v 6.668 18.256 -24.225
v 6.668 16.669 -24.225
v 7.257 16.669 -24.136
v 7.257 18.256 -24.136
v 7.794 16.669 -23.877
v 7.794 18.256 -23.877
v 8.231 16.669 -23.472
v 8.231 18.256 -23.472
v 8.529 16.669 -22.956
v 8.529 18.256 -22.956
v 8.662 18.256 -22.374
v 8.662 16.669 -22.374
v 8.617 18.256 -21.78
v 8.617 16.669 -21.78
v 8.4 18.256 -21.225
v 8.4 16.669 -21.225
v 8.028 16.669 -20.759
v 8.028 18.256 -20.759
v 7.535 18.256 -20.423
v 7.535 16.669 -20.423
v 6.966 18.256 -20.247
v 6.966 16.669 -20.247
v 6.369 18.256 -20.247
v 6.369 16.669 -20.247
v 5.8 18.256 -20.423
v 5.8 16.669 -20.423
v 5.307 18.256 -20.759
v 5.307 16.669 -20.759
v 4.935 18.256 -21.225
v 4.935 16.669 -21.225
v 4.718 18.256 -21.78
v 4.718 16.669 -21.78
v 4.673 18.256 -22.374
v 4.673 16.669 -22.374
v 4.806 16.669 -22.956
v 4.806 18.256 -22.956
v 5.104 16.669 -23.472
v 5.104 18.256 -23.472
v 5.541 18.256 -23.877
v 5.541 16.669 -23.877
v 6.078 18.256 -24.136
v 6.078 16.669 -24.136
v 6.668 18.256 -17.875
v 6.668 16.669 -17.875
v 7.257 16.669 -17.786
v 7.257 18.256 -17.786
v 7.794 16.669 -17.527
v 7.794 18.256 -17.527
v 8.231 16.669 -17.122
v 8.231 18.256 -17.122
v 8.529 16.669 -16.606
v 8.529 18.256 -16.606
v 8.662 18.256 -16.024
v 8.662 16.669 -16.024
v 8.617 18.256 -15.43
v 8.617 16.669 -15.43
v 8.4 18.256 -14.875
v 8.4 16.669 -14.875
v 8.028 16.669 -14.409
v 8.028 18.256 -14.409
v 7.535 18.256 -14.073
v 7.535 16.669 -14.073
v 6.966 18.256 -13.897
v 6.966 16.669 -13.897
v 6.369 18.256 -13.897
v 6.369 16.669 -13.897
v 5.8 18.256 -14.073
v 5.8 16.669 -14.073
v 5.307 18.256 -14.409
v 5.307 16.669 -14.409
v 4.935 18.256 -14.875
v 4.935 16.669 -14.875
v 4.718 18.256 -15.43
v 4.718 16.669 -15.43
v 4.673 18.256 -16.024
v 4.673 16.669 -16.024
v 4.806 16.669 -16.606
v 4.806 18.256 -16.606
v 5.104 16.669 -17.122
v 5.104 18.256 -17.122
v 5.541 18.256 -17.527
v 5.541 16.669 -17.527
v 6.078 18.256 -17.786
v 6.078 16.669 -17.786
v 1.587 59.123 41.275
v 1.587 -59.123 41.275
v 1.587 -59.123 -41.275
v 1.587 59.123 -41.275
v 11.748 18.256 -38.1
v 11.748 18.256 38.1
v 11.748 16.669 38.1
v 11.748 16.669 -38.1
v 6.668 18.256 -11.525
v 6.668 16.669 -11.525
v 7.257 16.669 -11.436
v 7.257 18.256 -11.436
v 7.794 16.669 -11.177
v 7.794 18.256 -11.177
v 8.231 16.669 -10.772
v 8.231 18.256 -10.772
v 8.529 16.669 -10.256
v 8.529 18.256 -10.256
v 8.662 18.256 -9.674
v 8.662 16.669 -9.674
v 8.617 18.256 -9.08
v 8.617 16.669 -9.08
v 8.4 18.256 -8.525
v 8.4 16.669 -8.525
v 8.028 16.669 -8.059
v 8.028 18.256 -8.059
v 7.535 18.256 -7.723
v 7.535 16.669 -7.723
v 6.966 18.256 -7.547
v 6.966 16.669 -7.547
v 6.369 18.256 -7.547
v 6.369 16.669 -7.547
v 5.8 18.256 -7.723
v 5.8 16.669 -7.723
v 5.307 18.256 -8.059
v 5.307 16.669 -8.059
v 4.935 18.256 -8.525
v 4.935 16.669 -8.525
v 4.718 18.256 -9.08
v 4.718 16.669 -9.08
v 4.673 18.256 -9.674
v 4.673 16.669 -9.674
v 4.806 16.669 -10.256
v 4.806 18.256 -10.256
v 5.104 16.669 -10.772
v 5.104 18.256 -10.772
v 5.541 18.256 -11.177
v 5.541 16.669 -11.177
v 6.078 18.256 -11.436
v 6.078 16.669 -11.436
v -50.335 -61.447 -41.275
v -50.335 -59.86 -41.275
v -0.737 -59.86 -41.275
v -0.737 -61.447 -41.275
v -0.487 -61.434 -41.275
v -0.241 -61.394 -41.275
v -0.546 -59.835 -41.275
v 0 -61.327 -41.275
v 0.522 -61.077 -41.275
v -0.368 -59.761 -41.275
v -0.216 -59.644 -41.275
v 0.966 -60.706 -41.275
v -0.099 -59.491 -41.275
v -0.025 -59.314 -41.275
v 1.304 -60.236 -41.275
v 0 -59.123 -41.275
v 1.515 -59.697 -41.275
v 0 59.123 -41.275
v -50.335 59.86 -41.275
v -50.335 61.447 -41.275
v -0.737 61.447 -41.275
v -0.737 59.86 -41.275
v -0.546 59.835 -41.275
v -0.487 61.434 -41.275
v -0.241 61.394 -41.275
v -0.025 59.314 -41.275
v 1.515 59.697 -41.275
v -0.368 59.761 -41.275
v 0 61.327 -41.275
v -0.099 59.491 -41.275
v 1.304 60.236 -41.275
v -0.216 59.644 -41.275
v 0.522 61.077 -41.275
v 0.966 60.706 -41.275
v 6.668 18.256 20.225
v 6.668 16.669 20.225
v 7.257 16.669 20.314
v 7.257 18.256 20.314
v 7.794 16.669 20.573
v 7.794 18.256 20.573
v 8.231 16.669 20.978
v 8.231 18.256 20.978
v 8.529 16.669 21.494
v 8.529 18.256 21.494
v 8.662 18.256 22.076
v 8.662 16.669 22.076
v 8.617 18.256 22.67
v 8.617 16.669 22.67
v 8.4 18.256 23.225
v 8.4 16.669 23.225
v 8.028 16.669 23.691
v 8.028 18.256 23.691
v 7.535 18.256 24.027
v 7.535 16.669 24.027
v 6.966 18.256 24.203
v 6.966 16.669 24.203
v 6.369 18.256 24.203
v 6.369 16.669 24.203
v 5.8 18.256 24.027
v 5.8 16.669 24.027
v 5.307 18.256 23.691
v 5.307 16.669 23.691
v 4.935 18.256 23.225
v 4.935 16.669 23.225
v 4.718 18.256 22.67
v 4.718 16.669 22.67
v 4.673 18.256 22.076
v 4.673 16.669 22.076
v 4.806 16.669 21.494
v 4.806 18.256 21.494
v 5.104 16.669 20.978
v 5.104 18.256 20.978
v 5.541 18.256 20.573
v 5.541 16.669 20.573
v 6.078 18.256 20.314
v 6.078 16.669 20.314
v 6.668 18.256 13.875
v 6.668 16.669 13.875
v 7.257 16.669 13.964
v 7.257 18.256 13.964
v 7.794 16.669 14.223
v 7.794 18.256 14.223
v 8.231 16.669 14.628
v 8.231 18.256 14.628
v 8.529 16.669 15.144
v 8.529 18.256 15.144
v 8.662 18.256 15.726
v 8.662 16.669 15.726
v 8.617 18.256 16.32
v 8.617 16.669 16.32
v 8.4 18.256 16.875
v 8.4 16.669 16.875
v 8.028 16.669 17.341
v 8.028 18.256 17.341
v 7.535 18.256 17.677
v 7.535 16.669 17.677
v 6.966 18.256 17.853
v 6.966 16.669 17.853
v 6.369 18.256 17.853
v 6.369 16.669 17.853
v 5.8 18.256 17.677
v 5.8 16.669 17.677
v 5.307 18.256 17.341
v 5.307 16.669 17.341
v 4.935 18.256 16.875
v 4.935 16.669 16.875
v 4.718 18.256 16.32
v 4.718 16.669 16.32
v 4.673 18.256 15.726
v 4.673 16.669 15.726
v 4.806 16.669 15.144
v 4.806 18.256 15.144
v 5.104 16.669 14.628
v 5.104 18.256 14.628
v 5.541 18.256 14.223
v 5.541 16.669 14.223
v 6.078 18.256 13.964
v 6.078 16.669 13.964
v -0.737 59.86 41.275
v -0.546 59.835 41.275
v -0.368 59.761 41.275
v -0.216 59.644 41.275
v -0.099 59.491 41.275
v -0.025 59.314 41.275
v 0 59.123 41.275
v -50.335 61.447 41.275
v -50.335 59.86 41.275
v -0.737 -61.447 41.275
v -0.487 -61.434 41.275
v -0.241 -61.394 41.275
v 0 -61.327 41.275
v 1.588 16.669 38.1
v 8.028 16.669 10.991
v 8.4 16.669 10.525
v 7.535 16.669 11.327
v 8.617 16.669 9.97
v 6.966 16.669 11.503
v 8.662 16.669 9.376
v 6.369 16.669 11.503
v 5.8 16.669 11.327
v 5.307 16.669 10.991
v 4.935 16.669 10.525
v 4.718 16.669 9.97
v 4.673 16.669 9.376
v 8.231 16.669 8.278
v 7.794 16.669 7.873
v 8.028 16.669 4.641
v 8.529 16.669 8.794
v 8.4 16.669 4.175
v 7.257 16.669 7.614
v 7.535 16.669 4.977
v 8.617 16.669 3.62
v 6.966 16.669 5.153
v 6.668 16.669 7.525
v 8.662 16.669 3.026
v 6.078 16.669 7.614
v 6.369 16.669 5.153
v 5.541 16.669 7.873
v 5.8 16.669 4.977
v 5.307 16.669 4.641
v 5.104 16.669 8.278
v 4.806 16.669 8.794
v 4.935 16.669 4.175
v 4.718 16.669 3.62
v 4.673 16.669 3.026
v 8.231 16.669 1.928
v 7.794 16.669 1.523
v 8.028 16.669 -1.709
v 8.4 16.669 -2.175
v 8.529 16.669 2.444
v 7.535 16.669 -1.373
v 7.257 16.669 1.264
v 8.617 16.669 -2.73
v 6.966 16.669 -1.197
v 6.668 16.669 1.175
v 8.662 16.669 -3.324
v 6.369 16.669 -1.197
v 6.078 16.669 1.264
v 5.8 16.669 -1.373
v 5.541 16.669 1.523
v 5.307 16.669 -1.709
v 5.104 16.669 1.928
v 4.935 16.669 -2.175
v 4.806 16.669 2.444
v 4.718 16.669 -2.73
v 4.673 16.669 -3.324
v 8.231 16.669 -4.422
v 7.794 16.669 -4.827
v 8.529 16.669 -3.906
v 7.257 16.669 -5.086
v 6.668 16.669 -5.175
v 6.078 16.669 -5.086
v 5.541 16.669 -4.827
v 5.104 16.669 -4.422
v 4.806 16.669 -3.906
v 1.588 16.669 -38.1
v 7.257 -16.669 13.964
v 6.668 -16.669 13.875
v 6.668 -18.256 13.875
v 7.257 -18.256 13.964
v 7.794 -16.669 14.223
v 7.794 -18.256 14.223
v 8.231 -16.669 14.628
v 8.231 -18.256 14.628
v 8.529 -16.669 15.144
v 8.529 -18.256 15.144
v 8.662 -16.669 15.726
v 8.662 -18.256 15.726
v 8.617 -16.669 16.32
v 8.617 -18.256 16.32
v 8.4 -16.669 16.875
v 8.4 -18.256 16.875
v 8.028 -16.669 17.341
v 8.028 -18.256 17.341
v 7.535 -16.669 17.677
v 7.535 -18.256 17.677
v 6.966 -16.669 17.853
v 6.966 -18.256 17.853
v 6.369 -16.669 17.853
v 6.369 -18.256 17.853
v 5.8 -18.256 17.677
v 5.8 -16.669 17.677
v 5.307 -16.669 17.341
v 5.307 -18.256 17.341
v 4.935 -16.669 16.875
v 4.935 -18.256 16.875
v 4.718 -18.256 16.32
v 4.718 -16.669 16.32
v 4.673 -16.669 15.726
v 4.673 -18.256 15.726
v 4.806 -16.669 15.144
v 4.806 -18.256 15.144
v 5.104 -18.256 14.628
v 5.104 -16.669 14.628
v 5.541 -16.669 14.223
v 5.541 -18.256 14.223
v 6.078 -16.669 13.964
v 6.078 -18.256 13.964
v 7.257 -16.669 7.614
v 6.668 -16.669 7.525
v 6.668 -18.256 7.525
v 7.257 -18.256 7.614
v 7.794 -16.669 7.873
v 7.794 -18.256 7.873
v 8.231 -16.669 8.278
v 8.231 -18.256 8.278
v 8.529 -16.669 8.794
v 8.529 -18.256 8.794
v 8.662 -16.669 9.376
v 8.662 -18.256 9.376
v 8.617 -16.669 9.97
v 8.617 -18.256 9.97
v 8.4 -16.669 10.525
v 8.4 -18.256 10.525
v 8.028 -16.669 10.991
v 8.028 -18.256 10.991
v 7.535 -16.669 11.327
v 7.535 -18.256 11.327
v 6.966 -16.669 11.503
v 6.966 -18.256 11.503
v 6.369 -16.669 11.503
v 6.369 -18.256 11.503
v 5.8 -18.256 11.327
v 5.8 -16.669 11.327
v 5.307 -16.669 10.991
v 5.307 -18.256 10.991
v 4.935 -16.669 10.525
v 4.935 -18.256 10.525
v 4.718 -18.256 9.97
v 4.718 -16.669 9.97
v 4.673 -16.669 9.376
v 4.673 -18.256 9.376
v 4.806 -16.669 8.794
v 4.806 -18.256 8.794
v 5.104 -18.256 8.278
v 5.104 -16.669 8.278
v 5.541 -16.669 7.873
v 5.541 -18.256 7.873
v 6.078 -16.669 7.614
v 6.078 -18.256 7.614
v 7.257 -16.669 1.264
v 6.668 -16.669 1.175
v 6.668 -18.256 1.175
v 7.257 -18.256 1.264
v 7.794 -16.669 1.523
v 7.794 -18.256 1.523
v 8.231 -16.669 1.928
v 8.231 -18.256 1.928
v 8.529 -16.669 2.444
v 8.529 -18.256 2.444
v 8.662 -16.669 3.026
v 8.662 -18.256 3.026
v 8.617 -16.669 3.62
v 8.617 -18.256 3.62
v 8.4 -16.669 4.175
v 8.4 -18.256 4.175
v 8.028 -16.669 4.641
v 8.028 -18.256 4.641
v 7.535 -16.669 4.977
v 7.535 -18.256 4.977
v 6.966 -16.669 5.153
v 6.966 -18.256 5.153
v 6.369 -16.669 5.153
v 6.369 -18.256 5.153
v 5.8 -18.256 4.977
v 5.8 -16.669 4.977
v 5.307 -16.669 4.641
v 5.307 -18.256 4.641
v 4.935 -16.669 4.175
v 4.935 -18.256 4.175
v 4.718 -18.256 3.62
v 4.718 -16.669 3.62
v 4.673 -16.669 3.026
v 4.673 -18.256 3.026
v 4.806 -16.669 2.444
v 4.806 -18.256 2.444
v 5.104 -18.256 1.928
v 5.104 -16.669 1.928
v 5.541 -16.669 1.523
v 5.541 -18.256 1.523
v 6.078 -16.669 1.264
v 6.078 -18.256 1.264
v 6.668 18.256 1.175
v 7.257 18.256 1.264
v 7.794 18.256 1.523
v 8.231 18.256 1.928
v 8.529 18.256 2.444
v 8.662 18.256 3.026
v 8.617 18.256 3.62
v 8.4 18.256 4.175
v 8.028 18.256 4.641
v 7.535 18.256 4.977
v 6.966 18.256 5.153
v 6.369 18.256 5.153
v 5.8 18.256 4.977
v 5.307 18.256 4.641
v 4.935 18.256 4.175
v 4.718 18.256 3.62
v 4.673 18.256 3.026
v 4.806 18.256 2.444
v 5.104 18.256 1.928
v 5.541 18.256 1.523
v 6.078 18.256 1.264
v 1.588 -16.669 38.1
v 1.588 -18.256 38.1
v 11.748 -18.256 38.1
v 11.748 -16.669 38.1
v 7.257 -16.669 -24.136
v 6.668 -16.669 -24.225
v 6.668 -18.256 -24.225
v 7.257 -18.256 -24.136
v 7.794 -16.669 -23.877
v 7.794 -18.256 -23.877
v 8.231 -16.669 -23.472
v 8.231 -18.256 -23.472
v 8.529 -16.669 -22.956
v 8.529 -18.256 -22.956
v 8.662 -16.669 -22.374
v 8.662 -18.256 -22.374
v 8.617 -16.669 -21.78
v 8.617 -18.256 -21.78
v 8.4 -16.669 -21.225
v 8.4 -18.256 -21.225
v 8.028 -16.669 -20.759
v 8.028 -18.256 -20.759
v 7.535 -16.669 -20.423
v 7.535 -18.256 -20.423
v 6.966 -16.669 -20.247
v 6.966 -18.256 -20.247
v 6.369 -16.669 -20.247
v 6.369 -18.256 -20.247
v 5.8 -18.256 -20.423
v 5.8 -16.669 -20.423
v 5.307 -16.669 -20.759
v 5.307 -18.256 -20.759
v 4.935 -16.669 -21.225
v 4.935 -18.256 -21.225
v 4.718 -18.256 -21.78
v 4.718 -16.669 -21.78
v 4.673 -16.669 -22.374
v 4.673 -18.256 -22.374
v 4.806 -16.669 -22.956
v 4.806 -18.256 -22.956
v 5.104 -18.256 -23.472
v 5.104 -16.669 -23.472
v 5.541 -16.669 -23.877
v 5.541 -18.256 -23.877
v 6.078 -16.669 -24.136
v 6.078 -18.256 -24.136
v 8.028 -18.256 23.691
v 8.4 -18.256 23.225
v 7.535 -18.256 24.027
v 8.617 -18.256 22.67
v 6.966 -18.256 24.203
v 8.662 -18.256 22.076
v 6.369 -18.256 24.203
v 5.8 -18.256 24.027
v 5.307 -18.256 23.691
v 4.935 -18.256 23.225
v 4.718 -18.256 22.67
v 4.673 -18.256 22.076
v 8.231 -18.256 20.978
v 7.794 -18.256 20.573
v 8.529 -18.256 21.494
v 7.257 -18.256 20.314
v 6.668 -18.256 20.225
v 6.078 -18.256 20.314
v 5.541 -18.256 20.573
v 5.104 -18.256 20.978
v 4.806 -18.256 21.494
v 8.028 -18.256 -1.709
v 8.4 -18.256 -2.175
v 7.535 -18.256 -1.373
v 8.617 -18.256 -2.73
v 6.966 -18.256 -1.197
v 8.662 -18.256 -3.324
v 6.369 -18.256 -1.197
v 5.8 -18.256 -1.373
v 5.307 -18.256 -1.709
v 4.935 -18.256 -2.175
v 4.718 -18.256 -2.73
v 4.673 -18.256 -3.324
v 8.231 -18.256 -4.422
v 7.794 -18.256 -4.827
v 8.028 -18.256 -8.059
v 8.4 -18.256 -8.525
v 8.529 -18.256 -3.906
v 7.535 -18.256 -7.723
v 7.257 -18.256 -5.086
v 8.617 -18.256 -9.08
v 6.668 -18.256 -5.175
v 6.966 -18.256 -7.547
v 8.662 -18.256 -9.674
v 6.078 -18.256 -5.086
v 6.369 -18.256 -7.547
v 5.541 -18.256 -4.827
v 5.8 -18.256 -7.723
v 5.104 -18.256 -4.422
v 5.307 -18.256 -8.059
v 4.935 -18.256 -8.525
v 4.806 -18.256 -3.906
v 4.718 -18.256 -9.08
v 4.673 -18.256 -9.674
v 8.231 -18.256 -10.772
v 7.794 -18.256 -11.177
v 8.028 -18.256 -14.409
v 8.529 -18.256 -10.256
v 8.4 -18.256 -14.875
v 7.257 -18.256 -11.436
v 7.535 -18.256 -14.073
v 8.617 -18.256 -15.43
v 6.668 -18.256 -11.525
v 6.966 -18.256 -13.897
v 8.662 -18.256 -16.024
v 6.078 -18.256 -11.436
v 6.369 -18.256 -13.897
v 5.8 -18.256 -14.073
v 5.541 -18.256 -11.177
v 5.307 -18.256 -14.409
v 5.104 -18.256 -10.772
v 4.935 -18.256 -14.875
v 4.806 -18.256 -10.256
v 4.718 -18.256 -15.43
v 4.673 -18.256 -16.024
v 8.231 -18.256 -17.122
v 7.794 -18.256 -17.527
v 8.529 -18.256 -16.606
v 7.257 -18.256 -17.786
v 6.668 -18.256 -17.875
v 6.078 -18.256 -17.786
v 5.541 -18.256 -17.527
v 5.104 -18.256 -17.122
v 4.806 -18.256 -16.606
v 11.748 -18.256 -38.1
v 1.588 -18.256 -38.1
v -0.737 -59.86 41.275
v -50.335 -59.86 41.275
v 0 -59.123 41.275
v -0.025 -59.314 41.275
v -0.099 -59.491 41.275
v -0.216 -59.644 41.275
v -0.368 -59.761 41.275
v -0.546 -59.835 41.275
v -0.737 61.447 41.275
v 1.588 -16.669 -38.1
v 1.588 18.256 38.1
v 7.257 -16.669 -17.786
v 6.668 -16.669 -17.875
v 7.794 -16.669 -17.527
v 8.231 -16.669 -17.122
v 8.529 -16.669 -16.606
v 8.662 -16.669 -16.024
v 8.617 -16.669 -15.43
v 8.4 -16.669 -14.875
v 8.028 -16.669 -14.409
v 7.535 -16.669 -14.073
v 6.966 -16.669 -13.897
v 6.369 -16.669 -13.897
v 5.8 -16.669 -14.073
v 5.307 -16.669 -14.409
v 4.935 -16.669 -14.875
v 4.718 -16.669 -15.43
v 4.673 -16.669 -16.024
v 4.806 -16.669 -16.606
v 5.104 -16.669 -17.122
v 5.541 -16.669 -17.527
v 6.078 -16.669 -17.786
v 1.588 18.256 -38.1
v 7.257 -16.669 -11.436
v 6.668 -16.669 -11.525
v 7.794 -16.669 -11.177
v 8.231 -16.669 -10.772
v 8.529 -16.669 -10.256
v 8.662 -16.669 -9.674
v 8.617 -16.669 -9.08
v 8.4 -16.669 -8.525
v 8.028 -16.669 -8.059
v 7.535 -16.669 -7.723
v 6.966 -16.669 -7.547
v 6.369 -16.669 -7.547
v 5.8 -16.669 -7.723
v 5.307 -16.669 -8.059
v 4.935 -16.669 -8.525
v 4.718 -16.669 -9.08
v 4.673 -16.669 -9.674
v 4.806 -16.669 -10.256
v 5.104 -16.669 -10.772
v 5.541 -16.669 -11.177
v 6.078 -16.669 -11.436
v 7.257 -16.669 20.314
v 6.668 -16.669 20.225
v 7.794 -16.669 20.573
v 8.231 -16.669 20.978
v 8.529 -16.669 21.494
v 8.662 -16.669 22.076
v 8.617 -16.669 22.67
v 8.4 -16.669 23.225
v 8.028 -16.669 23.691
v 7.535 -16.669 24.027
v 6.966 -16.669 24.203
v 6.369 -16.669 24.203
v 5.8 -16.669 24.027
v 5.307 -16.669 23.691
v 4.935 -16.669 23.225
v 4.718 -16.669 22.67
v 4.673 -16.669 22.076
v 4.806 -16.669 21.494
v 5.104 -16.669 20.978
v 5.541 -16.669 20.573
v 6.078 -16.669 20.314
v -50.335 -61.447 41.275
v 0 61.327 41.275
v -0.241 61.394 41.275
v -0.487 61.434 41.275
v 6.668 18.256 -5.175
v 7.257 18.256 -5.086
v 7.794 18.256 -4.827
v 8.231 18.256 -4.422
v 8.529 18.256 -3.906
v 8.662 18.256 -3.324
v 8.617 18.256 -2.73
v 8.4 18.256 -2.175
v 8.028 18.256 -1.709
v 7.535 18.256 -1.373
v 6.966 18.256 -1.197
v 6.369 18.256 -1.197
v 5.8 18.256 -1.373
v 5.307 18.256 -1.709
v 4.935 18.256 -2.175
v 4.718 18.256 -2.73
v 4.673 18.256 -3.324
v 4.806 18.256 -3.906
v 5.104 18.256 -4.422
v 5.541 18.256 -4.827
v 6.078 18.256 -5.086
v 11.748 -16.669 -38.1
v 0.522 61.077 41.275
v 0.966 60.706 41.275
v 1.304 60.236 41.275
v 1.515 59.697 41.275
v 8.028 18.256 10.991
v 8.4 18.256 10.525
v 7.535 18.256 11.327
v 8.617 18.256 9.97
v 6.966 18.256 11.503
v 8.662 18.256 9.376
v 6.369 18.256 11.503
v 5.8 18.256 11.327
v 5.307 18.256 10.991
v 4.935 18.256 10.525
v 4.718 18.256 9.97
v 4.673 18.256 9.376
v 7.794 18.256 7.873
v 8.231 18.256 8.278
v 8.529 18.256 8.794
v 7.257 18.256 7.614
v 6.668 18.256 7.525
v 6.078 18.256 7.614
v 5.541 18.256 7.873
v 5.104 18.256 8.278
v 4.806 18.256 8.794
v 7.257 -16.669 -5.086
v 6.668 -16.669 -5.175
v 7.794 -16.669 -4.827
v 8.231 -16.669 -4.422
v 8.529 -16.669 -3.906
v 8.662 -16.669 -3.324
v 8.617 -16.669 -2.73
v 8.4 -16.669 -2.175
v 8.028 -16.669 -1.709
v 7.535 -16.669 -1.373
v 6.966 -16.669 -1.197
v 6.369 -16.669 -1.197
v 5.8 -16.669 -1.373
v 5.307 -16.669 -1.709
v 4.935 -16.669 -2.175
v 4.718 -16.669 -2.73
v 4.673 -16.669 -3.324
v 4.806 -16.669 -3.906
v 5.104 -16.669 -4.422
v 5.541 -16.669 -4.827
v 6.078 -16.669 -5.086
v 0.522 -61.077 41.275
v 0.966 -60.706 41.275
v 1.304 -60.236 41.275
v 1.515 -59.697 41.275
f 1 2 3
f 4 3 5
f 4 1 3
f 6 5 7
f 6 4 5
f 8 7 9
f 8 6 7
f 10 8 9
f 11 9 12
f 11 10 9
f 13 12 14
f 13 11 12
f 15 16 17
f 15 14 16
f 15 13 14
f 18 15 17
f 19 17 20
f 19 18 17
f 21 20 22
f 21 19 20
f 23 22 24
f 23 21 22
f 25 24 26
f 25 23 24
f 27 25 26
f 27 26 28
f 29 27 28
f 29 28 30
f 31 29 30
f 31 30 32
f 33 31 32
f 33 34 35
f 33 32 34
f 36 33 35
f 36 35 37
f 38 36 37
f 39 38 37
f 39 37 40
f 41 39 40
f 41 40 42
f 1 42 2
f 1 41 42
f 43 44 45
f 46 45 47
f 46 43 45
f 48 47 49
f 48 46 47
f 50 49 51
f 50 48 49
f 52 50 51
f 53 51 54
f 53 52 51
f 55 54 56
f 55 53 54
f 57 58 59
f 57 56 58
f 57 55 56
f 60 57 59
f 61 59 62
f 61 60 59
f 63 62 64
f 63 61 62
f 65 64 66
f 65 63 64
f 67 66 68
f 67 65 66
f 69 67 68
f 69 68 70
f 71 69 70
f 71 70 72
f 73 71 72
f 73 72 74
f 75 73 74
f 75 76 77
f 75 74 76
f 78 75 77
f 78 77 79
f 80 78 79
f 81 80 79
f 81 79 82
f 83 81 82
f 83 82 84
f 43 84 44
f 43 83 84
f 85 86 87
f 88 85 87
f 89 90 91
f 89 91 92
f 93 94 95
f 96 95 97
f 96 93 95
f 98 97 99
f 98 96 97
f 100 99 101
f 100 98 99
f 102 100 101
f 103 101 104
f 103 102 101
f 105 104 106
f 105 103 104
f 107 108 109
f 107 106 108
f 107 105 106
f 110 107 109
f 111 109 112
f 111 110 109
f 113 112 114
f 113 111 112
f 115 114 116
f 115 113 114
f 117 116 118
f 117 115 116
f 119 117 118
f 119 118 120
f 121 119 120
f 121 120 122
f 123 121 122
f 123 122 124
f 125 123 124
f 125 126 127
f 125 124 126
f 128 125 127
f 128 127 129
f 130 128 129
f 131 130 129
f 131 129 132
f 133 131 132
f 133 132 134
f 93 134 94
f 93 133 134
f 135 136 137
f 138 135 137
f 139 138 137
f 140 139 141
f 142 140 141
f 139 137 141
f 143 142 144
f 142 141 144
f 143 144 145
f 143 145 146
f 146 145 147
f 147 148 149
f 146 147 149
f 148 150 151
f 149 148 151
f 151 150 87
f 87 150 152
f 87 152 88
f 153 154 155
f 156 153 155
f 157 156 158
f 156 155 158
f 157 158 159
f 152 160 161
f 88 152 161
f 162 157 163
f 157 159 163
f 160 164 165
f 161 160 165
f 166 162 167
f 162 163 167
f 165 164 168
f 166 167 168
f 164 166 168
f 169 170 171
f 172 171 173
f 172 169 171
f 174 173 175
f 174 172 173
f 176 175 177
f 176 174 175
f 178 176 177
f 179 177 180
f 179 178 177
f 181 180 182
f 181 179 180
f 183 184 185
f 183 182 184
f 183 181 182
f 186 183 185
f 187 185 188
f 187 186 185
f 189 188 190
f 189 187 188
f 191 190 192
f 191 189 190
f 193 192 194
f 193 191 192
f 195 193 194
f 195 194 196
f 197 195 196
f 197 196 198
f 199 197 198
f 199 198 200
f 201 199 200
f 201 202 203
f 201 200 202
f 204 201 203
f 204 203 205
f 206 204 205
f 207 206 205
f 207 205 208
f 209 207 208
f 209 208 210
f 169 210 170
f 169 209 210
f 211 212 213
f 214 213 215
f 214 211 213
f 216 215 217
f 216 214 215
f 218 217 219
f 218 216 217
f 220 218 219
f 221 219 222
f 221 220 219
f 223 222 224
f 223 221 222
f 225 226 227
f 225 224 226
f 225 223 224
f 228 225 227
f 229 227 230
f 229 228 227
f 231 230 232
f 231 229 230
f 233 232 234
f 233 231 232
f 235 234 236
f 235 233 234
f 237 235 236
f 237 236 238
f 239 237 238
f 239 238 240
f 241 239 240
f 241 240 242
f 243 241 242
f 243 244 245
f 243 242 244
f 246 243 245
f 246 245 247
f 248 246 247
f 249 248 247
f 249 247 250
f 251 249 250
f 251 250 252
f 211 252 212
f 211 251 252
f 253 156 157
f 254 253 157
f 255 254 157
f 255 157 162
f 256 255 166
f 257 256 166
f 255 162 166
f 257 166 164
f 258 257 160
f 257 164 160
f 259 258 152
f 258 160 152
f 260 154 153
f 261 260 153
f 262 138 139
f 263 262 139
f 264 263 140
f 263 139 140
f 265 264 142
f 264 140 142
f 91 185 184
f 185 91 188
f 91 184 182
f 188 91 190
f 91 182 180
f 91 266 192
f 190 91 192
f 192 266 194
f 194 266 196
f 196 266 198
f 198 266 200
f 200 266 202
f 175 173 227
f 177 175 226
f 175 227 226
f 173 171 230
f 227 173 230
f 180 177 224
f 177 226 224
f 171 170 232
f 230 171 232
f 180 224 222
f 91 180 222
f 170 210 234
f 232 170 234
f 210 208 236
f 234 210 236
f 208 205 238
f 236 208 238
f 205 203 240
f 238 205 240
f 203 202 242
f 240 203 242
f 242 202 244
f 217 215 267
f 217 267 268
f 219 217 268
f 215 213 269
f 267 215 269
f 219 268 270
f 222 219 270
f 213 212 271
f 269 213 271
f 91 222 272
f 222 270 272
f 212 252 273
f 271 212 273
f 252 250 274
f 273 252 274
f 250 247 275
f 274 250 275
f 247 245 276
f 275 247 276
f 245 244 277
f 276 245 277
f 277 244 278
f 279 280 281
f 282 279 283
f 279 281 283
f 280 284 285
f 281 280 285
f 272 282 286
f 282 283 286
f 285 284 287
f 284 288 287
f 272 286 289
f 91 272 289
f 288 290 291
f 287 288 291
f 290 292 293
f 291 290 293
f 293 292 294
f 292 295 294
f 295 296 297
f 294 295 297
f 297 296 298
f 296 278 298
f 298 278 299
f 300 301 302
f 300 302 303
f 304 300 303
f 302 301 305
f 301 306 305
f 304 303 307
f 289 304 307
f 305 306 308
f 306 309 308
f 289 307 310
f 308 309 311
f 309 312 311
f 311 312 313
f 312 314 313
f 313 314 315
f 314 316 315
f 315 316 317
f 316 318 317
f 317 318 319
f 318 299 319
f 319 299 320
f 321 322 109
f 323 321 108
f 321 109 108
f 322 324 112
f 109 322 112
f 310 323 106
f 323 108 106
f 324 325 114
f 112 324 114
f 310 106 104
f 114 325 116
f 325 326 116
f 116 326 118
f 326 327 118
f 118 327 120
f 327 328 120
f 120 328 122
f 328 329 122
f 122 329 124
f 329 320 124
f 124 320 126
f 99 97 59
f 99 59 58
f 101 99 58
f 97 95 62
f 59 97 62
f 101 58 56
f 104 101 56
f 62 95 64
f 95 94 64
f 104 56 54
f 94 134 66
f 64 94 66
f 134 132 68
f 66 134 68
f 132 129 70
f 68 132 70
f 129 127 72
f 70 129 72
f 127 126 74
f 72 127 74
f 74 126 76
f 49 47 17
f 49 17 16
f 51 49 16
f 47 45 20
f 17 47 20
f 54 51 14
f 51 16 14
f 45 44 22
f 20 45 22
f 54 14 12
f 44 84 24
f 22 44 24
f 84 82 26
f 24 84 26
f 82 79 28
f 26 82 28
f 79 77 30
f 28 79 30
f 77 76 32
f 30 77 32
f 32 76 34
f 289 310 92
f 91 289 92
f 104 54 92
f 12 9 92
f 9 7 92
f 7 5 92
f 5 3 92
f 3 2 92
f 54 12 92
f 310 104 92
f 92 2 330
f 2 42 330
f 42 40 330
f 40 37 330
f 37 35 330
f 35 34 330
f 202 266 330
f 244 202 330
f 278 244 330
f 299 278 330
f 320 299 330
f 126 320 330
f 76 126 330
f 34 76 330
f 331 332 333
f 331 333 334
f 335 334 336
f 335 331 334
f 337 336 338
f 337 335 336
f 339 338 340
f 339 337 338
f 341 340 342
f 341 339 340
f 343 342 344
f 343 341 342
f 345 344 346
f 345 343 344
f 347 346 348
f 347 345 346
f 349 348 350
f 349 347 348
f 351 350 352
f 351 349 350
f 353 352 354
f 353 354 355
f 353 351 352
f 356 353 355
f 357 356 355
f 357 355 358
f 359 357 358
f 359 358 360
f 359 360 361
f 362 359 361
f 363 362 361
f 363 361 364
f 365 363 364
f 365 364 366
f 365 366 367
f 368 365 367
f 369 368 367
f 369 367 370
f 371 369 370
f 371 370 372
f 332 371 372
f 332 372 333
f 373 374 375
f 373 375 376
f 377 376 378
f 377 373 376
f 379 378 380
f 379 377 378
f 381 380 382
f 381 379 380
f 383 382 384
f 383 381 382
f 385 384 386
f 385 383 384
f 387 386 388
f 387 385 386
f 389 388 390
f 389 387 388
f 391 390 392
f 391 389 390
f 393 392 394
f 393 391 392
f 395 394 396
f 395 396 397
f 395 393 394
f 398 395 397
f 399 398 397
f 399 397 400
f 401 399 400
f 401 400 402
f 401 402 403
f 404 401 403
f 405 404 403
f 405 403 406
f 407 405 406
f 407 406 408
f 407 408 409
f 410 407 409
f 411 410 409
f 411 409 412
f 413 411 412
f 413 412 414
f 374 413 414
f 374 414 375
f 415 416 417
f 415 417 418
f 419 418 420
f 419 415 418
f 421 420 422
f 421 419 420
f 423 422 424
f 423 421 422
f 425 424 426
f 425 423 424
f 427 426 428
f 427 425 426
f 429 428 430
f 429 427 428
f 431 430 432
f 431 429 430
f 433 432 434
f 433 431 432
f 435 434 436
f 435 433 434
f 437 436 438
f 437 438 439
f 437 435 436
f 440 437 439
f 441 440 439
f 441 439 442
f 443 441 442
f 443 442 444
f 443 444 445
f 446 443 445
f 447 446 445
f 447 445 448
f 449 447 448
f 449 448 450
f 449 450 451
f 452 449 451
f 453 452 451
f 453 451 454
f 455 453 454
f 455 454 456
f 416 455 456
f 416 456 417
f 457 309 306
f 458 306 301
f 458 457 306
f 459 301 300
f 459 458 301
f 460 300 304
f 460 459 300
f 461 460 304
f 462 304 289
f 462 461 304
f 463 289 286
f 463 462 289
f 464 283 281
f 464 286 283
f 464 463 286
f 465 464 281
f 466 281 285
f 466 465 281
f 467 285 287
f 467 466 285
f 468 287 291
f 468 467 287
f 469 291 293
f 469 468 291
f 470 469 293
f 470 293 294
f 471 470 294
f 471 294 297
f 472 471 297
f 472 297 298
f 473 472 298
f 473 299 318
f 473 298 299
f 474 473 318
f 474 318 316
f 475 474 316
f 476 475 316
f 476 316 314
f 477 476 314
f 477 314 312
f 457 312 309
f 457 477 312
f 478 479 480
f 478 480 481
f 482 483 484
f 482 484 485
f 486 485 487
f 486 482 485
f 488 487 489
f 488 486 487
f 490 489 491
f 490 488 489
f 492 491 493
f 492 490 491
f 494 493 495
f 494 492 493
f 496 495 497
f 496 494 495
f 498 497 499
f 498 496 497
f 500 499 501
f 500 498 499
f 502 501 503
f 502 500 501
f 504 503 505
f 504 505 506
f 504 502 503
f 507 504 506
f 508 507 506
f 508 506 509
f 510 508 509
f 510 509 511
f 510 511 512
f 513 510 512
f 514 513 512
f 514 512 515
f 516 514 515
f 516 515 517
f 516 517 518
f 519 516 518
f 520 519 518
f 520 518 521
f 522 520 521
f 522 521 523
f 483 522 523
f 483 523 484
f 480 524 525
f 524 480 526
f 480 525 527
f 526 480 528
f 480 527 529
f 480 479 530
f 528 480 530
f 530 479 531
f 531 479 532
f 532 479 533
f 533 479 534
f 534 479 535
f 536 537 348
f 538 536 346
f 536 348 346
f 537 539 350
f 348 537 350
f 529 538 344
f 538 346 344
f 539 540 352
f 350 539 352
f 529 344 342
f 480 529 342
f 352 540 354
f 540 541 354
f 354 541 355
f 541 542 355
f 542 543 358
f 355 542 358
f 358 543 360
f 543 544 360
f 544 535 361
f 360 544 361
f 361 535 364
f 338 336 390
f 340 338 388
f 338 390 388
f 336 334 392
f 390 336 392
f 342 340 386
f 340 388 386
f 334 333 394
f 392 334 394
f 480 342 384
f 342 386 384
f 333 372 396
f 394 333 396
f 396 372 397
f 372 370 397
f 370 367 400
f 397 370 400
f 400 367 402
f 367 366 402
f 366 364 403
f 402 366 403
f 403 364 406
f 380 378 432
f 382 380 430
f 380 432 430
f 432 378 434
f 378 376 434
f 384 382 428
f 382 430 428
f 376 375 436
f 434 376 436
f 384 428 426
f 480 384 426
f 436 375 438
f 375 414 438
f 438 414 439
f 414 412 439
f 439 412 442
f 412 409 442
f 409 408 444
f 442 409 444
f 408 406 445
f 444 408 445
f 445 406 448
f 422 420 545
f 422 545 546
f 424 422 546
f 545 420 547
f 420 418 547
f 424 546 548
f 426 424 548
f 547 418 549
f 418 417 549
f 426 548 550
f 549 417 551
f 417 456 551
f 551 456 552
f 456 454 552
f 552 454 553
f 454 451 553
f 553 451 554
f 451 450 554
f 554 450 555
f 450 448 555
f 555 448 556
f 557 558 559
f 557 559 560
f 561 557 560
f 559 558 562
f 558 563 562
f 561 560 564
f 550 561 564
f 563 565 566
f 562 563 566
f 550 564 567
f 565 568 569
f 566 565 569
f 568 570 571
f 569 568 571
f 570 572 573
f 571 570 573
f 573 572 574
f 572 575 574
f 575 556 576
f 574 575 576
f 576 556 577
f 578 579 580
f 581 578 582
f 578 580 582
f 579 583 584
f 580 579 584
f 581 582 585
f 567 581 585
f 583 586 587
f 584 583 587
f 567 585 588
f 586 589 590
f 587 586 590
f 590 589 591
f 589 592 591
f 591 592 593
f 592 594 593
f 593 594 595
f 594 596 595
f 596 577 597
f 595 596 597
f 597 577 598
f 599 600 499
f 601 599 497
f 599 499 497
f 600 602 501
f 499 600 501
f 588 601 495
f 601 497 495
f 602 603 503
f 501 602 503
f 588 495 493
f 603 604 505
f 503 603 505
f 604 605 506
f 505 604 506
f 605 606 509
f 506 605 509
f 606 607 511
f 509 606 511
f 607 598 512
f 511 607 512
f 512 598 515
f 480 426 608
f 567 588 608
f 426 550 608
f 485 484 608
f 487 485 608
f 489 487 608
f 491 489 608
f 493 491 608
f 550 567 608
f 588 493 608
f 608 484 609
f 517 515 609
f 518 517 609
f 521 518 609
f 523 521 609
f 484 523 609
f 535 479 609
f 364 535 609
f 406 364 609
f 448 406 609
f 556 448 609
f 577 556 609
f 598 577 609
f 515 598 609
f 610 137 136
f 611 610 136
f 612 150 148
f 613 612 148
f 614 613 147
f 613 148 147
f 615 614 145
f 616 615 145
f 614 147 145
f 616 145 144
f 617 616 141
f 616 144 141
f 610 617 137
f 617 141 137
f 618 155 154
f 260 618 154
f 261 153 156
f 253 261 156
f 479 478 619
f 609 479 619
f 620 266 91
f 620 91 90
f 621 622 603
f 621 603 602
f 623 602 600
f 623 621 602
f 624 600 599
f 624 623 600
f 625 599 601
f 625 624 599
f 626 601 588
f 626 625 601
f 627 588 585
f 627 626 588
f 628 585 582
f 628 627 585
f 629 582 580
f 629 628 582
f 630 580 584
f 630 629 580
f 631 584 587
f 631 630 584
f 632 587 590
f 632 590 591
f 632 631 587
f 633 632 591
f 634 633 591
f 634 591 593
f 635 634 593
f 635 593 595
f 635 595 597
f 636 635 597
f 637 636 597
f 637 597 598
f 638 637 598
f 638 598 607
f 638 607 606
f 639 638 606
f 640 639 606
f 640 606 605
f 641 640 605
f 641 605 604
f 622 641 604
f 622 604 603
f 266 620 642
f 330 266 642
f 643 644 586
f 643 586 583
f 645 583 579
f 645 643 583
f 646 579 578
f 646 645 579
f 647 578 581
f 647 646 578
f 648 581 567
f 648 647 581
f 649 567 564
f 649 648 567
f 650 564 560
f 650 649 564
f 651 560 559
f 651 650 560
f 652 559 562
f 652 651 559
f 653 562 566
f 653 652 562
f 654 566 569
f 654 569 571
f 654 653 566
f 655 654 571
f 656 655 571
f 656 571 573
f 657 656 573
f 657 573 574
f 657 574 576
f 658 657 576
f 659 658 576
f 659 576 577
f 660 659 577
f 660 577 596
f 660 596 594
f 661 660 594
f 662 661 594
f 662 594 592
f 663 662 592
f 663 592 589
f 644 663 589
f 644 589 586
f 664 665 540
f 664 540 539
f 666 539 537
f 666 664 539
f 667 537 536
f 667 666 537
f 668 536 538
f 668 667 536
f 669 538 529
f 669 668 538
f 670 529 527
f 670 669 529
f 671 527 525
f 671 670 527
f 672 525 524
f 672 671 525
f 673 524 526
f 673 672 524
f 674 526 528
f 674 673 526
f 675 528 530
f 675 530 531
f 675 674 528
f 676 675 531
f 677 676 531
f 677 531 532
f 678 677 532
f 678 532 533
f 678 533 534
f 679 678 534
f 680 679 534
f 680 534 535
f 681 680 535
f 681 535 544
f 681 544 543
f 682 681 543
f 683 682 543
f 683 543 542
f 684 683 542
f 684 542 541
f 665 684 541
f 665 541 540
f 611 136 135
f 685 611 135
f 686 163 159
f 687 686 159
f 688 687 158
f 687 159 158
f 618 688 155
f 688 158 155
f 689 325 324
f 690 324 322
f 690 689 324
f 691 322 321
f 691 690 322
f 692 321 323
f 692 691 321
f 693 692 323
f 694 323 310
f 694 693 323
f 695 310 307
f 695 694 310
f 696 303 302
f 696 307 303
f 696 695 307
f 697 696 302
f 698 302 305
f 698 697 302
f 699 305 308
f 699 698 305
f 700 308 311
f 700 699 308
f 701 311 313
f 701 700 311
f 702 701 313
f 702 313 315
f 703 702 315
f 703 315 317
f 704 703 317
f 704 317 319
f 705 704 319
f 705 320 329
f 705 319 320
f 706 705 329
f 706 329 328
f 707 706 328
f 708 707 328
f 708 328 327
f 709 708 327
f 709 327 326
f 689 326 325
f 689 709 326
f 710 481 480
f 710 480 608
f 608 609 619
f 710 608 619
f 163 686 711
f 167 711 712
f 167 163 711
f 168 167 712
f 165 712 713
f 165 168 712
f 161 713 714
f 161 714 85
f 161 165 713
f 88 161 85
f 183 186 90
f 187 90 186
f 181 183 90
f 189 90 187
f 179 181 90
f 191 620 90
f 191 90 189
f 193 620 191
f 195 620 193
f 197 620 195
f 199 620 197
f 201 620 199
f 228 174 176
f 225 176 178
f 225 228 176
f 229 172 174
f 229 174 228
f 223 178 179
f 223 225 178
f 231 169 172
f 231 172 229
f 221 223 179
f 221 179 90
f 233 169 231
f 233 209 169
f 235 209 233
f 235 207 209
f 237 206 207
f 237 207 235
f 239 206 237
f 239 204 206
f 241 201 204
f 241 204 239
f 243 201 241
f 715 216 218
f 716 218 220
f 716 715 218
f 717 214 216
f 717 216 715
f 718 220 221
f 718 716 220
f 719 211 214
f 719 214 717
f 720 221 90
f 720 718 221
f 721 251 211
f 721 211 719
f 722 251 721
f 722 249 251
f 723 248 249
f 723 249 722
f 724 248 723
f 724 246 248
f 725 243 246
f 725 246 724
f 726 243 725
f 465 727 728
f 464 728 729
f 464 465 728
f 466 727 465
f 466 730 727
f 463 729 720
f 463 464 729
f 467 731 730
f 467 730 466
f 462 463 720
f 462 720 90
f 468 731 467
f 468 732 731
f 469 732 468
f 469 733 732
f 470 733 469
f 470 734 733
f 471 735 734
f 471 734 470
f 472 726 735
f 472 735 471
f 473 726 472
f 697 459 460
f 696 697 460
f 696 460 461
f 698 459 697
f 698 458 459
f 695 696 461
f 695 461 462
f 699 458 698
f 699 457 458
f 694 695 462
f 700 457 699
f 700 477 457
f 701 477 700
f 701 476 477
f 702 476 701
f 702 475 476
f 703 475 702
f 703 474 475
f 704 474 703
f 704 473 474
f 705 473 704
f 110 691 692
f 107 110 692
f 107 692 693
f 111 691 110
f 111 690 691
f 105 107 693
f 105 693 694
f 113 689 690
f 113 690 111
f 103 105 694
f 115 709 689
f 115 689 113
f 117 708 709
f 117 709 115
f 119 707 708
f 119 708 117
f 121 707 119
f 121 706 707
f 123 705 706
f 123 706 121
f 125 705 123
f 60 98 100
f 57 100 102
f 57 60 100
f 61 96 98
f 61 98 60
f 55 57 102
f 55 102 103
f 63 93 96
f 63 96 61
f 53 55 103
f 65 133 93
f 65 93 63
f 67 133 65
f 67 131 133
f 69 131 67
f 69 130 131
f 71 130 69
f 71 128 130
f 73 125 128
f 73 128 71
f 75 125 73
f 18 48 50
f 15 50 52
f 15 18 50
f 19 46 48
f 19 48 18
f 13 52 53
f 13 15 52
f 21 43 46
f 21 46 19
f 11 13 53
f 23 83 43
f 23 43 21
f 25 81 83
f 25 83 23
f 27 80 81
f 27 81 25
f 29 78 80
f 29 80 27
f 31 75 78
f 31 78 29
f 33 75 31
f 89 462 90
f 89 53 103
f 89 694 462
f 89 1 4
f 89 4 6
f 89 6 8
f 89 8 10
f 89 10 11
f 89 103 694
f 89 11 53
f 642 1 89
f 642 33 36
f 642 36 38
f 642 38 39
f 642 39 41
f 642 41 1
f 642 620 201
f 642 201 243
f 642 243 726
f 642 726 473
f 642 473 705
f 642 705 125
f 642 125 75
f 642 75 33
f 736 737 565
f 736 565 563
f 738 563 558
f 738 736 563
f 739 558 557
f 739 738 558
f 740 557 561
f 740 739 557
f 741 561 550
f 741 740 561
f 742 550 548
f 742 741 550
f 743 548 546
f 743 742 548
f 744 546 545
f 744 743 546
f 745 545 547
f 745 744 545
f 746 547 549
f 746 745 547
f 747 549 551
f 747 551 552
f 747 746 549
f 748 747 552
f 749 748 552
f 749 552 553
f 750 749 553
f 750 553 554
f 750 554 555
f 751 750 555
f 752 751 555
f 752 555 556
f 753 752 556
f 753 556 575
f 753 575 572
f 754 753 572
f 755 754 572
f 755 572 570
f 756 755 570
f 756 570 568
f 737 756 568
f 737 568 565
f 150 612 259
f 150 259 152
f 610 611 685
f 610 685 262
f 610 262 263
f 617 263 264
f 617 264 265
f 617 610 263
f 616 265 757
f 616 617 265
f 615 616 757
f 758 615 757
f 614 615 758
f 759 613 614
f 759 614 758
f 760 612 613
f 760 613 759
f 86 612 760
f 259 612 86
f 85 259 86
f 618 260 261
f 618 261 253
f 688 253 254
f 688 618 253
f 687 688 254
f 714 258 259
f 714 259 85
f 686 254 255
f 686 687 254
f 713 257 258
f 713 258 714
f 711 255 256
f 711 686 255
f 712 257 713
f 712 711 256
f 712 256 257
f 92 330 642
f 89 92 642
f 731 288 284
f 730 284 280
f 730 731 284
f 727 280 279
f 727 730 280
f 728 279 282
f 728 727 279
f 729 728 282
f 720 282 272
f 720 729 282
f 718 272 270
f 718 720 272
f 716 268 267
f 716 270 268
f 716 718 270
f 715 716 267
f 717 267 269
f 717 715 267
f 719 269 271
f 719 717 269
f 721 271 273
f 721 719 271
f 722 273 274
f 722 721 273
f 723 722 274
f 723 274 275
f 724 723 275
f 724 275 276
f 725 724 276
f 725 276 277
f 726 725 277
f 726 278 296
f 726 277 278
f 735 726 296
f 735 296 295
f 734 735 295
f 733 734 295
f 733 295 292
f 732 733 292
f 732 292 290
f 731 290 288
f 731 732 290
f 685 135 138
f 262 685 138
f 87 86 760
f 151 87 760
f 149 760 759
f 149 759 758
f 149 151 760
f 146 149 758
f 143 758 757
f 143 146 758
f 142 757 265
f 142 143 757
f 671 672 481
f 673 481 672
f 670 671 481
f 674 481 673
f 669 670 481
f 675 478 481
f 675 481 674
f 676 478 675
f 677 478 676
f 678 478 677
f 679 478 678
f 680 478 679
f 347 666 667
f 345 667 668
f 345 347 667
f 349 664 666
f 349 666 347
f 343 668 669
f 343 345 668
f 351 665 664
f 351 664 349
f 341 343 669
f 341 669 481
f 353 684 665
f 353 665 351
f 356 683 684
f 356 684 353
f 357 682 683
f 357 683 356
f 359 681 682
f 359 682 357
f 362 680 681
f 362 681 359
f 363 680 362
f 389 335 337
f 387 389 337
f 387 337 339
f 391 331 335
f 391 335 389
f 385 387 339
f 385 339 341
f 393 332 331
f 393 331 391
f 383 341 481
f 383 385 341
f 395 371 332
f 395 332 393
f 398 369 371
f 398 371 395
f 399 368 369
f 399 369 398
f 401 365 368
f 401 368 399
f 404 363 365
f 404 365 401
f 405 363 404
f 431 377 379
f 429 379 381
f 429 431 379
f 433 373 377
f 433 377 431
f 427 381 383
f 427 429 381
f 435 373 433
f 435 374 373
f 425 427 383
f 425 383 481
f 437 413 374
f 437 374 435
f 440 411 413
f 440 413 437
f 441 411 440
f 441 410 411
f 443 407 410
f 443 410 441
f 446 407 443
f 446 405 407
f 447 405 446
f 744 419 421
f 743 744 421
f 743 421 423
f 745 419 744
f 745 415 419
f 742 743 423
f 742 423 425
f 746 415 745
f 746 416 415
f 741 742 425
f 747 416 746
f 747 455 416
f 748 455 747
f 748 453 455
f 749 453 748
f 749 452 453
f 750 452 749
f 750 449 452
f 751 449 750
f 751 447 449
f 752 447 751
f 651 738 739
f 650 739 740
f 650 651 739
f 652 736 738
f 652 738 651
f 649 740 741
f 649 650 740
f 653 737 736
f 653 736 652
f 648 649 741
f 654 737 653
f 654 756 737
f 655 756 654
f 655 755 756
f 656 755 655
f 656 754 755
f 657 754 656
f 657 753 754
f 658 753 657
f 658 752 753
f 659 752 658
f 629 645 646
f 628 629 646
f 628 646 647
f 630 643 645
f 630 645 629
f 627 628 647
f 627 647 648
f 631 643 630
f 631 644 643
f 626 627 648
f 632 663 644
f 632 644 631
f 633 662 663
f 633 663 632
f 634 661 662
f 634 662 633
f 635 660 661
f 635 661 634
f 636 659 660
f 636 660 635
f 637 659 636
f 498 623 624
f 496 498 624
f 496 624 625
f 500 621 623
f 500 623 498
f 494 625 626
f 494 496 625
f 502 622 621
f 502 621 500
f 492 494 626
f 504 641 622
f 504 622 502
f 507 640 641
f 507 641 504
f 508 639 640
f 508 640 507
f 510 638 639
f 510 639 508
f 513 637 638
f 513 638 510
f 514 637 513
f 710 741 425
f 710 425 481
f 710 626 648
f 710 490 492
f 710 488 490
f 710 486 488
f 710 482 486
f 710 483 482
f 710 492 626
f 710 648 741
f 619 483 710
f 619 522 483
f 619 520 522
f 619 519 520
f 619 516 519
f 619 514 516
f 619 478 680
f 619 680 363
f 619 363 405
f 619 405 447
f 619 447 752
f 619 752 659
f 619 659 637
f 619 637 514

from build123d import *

# Parameters (mm, degrees)
SKETCH1_W              = 82.55
SKETCH1_H              = 222.25
BASE_FLANGE1_DEPTH     = 1.5875
SKETCHED_START         = -41.275
SKETCHED_BEND1_DEPTH   = 82.55
SKETCHED_BEND1_2_DEPTH = 82.55
SKETCH8_W              = 76.2
SKETCH8_H              = 1.5875
BOSS_EXTRUDE1_DEPTH    = 10.16
BOSS_EXTRUDE1_2_DEPTH  = 10.16
CUT_EXTRUDE1_START     = -36.5125
SKETCH11_R             = 2
CUT_EXTRUDE1_DEPTH     = 36.5125


# Read off the part's stored shape, not the designer's step: Sketched Bend1
# Sheet-metal steps are written as plain solids
with BuildPart() as part:
    # Sketch1 → Base-Flange1 (new body)
    with BuildSketch(Plane(origin=(0, 0, 0), x_dir=(0, 0, -1), z_dir=(1, 0, 0))):
        Rectangle(SKETCH1_W, SKETCH1_H)
    extrude(amount=BASE_FLANGE1_DEPTH)

    # Sketched Bend1 outline → Sketched Bend1 (cut)
    with BuildSketch(Plane.XY.offset(SKETCHED_START)):
        with BuildLine():
            ThreePointArc((0, 61.3273484), (1.149317929, 60.481283273), (1.5875, 59.123065921))
            Line((1.5875, 59.123065921), (1.5875, 111.125))
            Line((1.5875, 111.125), (0, 111.125))
            Line((0, 111.125), (0, 61.3273484))
        make_face()
        with BuildLine():
            Line((1.5875, -111.125), (1.5875, -59.123065921))
            ThreePointArc((1.5875, -59.123065921), (1.149317929, -60.481283273), (0, -61.3273484))
            Line((0, -61.3273484), (0, -111.125))
            Line((0, -111.125), (1.5875, -111.125))
        make_face()
    extrude(amount=SKETCHED_BEND1_DEPTH, mode=Mode.SUBTRACT)

    # Sketched Bend1 2 outline → Sketched Bend1 2 (add)
    with BuildSketch(Plane.XY.offset(SKETCHED_START)):
        with BuildLine():
            Line((0, 59.123065921), (0, 61.3273484))
            ThreePointArc((0, 61.3273484), (-0.363459343, 61.417015977), (-0.7366, 61.447165921))
            Line((-0.7366, 61.447165921), (-50.334665921, 61.447165921))
            Line((-50.334665921, 61.447165921), (-50.334665921, 59.859665921))
            Line((-50.334665921, 59.859665921), (-0.7366, 59.859665921))
            ThreePointArc((-0.7366, 59.859665921), (-0.215745145, 59.643920776), (0, 59.123065921))
        make_face()
        with BuildLine():
            ThreePointArc((-0.7366, -61.447165921), (-0.363459343, -61.417015977), (0, -61.3273484))
            Line((0, -61.3273484), (0, -59.123065921))
            ThreePointArc((0, -59.123065921), (-0.215745145, -59.643920776), (-0.7366, -59.859665921))
            Line((-0.7366, -59.859665921), (-50.334665921, -59.859665921))
            Line((-50.334665921, -59.859665921), (-50.334665921, -61.447165921))
            Line((-50.334665921, -61.447165921), (-0.7366, -61.447165921))
        make_face()
    extrude(amount=SKETCHED_BEND1_2_DEPTH)


with BuildPart() as body_2:
    # Sketch8 → Boss-Extrude1 (new body)
    with BuildSketch(Plane(origin=(1.5875, 0, 0), x_dir=(0, 0, -1), z_dir=(1, 0, 0))):
        with Locations((0, -17.4625)):
            Rectangle(SKETCH8_W, SKETCH8_H)
    extrude(amount=BOSS_EXTRUDE1_DEPTH)


with BuildPart() as body_3:
    # Sketch8 → Boss-Extrude1 2 (new body)
    with BuildSketch(Plane(origin=(1.5875, 0, 0), x_dir=(0, 0, -1), z_dir=(1, 0, 0))):
        with Locations((0, 17.4625)):
            Rectangle(SKETCH8_W, SKETCH8_H)
    extrude(amount=BOSS_EXTRUDE1_2_DEPTH)


with BuildPart() as cut_extrude1_tool:
    # Sketch11 → Cut-Extrude1 (new body)
    with BuildSketch(Plane.XZ.offset(18.25625).offset(CUT_EXTRUDE1_START)):
        with Locations(Location((6.6675, 3.175, 0), (0, 0, 270))):
            Circle(SKETCH11_R)
        with Locations(Location((6.6675, -3.175, 0), (0, 0, 270))):
            Circle(SKETCH11_R)
        with Locations(Location((6.6675, 9.525, 0), (0, 0, 270))):
            Circle(SKETCH11_R)
        with Locations(Location((6.6675, 15.875, 0), (0, 0, 270))):
            Circle(SKETCH11_R)
        with Locations(Location((6.6675, 22.225, 0), (0, 0, 270))):
            Circle(SKETCH11_R)
        with Locations(Location((6.6675, -9.525, 0), (0, 0, 270))):
            Circle(SKETCH11_R)
        with Locations(Location((6.6675, -15.875, 0), (0, 0, 270))):
            Circle(SKETCH11_R)
        with Locations(Location((6.6675, -22.225, 0), (0, 0, 270))):
            Circle(SKETCH11_R)
    extrude(amount=CUT_EXTRUDE1_DEPTH)


with BuildPart() as body_2_1:
    add(body_2.part)

    # Cut-Extrude1: cut by cut_extrude1_tool
    add(cut_extrude1_tool.part, mode=Mode.SUBTRACT)


with BuildPart() as body_3_1:
    add(body_3.part)

    # Cut-Extrude1: cut by cut_extrude1_tool
    add(cut_extrude1_tool.part, mode=Mode.SUBTRACT)


solid = Compound([part.part, body_2_1.part, body_3_1.part])
